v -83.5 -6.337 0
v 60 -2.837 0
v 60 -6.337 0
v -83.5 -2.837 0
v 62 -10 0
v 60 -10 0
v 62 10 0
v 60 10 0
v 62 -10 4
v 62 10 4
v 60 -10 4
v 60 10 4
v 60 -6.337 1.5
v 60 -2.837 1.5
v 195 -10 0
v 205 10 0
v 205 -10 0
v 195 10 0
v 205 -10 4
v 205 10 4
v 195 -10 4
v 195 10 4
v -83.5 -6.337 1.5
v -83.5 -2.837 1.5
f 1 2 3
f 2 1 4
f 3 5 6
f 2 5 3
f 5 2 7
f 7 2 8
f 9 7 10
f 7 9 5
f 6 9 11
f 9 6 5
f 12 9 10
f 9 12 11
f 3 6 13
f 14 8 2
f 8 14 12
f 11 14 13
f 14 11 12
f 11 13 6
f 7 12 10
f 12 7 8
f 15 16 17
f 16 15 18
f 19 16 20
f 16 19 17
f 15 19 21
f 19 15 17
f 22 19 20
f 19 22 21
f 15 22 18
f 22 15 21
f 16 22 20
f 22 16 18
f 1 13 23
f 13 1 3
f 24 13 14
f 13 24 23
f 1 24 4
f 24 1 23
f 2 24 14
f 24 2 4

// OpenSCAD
// Generated by DescriptiveCAD bootstrap v0.2
  // boundary visualization
  polyhedron(points=[[-34.586832, 83.505000, 0.000000], [34.586832, 83.505000, 0.000000], [34.586832, 83.495000, 0.000000], [-34.586832, 83.495000, 0.000000], [-34.586832, 83.505000, 13.750000], [34.586832, 83.505000, 13.750000], [34.586832, 83.495000, 13.750000], [-34.586832, 83.495000, 13.750000]], faces=[[0, 1, 2, 3], [4, 5, 6, 7], [0, 1, 5, 4], [1, 2, 6, 5], [2, 3, 7, 6], [3, 0, 4, 7]]);
  polyhedron(points=[[34.590368, 83.503536, 0.000000], [83.503536, 34.590368, 0.000000], [83.496464, 34.583297, 0.000000], [34.583297, 83.496464, 0.000000], [34.590368, 83.503536, 13.750000], [83.503536, 34.590368, 13.750000], [83.496464, 34.583297, 13.750000], [34.583297, 83.496464, 13.750000]], faces=[[0, 1, 2, 3], [4, 5, 6, 7], [0, 1, 5, 4], [1, 2, 6, 5], [2, 3, 7, 6], [3, 0, 4, 7]]);
  polyhedron(points=[[83.505000, 34.586832, 0.000000], [83.505000, -34.586832, 0.000000], [83.495000, -34.586832, 0.000000], [83.495000, 34.586832, 0.000000], [83.505000, 34.586832, 13.750000], [83.505000, -34.586832, 13.750000], [83.495000, -34.586832, 13.750000], [83.495000, 34.586832, 13.750000]], faces=[[0, 1, 2, 3], [4, 5, 6, 7], [0, 1, 5, 4], [1, 2, 6, 5], [2, 3, 7, 6], [3, 0, 4, 7]]);
  polyhedron(points=[[83.503536, -34.590368, 0.000000], [34.590368, -83.503536, 0.000000], [34.583297, -83.496464, 0.000000], [83.496464, -34.583297, 0.000000], [83.503536, -34.590368, 13.750000], [34.590368, -83.503536, 13.750000], [34.583297, -83.496464, 13.750000], [83.496464, -34.583297, 13.750000]], faces=[[0, 1, 2, 3], [4, 5, 6, 7], [0, 1, 5, 4], [1, 2, 6, 5], [2, 3, 7, 6], [3, 0, 4, 7]]);
  polyhedron(points=[[34.586832, -83.505000, 0.000000], [-34.586832, -83.505000, 0.000000], [-34.586832, -83.495000, 0.000000], [34.586832, -83.495000, 0.000000], [34.586832, -83.505000, 13.750000], [-34.586832, -83.505000, 13.750000], [-34.586832, -83.495000, 13.750000], [34.586832, -83.495000, 13.750000]], faces=[[0, 1, 2, 3], [4, 5, 6, 7], [0, 1, 5, 4], [1, 2, 6, 5], [2, 3, 7, 6], [3, 0, 4, 7]]);
  polyhedron(points=[[-34.590368, -83.503536, 0.000000], [-83.503536, -34.590368, 0.000000], [-83.496464, -34.583297, 0.000000], [-34.583297, -83.496464, 0.000000], [-34.590368, -83.503536, 13.750000], [-83.503536, -34.590368, 13.750000], [-83.496464, -34.583297, 13.750000], [-34.583297, -83.496464, 13.750000]], faces=[[0, 1, 2, 3], [4, 5, 6, 7], [0, 1, 5, 4], [1, 2, 6, 5], [2, 3, 7, 6], [3, 0, 4, 7]]);
  polyhedron(points=[[-83.505000, -34.586832, 0.000000], [-83.505000, 34.586832, 0.000000], [-83.495000, 34.586832, 0.000000], [-83.495000, -34.586832, 0.000000], [-83.505000, -34.586832, 13.750000], [-83.505000, 34.586832, 13.750000], [-83.495000, 34.586832, 13.750000], [-83.495000, -34.586832, 13.750000]], faces=[[0, 1, 2, 3], [4, 5, 6, 7], [0, 1, 5, 4], [1, 2, 6, 5], [2, 3, 7, 6], [3, 0, 4, 7]]);
  polyhedron(points=[[-83.503536, 34.590368, 0.000000], [-34.590368, 83.503536, 0.000000], [-34.583297, 83.496464, 0.000000], [-83.496464, 34.583297, 0.000000], [-83.503536, 34.590368, 13.750000], [-34.590368, 83.503536, 13.750000], [-34.583297, 83.496464, 13.750000], [-83.496464, 34.583297, 13.750000]], faces=[[0, 1, 2, 3], [4, 5, 6, 7], [0, 1, 5, 4], [1, 2, 6, 5], [2, 3, 7, 6], [3, 0, 4, 7]]);
  translate([0,0,0]) linear_extrude(height=4) polygon(points=[[60.000000, -10.000000], [62.000000, -10.000000], [62.000000, 10.000000], [60.000000, 10.000000]]);
  translate([0,0,0]) linear_extrude(height=4) polygon(points=[[195.000000, -10.000000], [205.000000, -10.000000], [205.000000, 10.000000], [195.000000, 10.000000]]);
  translate([0,0,0.0]) linear_extrude(height=1.5) polygon(points=[[60.000000, -2.836832], [-83.500000, -2.836832], [-83.500000, -6.336832], [60.000000, -6.336832]]);
